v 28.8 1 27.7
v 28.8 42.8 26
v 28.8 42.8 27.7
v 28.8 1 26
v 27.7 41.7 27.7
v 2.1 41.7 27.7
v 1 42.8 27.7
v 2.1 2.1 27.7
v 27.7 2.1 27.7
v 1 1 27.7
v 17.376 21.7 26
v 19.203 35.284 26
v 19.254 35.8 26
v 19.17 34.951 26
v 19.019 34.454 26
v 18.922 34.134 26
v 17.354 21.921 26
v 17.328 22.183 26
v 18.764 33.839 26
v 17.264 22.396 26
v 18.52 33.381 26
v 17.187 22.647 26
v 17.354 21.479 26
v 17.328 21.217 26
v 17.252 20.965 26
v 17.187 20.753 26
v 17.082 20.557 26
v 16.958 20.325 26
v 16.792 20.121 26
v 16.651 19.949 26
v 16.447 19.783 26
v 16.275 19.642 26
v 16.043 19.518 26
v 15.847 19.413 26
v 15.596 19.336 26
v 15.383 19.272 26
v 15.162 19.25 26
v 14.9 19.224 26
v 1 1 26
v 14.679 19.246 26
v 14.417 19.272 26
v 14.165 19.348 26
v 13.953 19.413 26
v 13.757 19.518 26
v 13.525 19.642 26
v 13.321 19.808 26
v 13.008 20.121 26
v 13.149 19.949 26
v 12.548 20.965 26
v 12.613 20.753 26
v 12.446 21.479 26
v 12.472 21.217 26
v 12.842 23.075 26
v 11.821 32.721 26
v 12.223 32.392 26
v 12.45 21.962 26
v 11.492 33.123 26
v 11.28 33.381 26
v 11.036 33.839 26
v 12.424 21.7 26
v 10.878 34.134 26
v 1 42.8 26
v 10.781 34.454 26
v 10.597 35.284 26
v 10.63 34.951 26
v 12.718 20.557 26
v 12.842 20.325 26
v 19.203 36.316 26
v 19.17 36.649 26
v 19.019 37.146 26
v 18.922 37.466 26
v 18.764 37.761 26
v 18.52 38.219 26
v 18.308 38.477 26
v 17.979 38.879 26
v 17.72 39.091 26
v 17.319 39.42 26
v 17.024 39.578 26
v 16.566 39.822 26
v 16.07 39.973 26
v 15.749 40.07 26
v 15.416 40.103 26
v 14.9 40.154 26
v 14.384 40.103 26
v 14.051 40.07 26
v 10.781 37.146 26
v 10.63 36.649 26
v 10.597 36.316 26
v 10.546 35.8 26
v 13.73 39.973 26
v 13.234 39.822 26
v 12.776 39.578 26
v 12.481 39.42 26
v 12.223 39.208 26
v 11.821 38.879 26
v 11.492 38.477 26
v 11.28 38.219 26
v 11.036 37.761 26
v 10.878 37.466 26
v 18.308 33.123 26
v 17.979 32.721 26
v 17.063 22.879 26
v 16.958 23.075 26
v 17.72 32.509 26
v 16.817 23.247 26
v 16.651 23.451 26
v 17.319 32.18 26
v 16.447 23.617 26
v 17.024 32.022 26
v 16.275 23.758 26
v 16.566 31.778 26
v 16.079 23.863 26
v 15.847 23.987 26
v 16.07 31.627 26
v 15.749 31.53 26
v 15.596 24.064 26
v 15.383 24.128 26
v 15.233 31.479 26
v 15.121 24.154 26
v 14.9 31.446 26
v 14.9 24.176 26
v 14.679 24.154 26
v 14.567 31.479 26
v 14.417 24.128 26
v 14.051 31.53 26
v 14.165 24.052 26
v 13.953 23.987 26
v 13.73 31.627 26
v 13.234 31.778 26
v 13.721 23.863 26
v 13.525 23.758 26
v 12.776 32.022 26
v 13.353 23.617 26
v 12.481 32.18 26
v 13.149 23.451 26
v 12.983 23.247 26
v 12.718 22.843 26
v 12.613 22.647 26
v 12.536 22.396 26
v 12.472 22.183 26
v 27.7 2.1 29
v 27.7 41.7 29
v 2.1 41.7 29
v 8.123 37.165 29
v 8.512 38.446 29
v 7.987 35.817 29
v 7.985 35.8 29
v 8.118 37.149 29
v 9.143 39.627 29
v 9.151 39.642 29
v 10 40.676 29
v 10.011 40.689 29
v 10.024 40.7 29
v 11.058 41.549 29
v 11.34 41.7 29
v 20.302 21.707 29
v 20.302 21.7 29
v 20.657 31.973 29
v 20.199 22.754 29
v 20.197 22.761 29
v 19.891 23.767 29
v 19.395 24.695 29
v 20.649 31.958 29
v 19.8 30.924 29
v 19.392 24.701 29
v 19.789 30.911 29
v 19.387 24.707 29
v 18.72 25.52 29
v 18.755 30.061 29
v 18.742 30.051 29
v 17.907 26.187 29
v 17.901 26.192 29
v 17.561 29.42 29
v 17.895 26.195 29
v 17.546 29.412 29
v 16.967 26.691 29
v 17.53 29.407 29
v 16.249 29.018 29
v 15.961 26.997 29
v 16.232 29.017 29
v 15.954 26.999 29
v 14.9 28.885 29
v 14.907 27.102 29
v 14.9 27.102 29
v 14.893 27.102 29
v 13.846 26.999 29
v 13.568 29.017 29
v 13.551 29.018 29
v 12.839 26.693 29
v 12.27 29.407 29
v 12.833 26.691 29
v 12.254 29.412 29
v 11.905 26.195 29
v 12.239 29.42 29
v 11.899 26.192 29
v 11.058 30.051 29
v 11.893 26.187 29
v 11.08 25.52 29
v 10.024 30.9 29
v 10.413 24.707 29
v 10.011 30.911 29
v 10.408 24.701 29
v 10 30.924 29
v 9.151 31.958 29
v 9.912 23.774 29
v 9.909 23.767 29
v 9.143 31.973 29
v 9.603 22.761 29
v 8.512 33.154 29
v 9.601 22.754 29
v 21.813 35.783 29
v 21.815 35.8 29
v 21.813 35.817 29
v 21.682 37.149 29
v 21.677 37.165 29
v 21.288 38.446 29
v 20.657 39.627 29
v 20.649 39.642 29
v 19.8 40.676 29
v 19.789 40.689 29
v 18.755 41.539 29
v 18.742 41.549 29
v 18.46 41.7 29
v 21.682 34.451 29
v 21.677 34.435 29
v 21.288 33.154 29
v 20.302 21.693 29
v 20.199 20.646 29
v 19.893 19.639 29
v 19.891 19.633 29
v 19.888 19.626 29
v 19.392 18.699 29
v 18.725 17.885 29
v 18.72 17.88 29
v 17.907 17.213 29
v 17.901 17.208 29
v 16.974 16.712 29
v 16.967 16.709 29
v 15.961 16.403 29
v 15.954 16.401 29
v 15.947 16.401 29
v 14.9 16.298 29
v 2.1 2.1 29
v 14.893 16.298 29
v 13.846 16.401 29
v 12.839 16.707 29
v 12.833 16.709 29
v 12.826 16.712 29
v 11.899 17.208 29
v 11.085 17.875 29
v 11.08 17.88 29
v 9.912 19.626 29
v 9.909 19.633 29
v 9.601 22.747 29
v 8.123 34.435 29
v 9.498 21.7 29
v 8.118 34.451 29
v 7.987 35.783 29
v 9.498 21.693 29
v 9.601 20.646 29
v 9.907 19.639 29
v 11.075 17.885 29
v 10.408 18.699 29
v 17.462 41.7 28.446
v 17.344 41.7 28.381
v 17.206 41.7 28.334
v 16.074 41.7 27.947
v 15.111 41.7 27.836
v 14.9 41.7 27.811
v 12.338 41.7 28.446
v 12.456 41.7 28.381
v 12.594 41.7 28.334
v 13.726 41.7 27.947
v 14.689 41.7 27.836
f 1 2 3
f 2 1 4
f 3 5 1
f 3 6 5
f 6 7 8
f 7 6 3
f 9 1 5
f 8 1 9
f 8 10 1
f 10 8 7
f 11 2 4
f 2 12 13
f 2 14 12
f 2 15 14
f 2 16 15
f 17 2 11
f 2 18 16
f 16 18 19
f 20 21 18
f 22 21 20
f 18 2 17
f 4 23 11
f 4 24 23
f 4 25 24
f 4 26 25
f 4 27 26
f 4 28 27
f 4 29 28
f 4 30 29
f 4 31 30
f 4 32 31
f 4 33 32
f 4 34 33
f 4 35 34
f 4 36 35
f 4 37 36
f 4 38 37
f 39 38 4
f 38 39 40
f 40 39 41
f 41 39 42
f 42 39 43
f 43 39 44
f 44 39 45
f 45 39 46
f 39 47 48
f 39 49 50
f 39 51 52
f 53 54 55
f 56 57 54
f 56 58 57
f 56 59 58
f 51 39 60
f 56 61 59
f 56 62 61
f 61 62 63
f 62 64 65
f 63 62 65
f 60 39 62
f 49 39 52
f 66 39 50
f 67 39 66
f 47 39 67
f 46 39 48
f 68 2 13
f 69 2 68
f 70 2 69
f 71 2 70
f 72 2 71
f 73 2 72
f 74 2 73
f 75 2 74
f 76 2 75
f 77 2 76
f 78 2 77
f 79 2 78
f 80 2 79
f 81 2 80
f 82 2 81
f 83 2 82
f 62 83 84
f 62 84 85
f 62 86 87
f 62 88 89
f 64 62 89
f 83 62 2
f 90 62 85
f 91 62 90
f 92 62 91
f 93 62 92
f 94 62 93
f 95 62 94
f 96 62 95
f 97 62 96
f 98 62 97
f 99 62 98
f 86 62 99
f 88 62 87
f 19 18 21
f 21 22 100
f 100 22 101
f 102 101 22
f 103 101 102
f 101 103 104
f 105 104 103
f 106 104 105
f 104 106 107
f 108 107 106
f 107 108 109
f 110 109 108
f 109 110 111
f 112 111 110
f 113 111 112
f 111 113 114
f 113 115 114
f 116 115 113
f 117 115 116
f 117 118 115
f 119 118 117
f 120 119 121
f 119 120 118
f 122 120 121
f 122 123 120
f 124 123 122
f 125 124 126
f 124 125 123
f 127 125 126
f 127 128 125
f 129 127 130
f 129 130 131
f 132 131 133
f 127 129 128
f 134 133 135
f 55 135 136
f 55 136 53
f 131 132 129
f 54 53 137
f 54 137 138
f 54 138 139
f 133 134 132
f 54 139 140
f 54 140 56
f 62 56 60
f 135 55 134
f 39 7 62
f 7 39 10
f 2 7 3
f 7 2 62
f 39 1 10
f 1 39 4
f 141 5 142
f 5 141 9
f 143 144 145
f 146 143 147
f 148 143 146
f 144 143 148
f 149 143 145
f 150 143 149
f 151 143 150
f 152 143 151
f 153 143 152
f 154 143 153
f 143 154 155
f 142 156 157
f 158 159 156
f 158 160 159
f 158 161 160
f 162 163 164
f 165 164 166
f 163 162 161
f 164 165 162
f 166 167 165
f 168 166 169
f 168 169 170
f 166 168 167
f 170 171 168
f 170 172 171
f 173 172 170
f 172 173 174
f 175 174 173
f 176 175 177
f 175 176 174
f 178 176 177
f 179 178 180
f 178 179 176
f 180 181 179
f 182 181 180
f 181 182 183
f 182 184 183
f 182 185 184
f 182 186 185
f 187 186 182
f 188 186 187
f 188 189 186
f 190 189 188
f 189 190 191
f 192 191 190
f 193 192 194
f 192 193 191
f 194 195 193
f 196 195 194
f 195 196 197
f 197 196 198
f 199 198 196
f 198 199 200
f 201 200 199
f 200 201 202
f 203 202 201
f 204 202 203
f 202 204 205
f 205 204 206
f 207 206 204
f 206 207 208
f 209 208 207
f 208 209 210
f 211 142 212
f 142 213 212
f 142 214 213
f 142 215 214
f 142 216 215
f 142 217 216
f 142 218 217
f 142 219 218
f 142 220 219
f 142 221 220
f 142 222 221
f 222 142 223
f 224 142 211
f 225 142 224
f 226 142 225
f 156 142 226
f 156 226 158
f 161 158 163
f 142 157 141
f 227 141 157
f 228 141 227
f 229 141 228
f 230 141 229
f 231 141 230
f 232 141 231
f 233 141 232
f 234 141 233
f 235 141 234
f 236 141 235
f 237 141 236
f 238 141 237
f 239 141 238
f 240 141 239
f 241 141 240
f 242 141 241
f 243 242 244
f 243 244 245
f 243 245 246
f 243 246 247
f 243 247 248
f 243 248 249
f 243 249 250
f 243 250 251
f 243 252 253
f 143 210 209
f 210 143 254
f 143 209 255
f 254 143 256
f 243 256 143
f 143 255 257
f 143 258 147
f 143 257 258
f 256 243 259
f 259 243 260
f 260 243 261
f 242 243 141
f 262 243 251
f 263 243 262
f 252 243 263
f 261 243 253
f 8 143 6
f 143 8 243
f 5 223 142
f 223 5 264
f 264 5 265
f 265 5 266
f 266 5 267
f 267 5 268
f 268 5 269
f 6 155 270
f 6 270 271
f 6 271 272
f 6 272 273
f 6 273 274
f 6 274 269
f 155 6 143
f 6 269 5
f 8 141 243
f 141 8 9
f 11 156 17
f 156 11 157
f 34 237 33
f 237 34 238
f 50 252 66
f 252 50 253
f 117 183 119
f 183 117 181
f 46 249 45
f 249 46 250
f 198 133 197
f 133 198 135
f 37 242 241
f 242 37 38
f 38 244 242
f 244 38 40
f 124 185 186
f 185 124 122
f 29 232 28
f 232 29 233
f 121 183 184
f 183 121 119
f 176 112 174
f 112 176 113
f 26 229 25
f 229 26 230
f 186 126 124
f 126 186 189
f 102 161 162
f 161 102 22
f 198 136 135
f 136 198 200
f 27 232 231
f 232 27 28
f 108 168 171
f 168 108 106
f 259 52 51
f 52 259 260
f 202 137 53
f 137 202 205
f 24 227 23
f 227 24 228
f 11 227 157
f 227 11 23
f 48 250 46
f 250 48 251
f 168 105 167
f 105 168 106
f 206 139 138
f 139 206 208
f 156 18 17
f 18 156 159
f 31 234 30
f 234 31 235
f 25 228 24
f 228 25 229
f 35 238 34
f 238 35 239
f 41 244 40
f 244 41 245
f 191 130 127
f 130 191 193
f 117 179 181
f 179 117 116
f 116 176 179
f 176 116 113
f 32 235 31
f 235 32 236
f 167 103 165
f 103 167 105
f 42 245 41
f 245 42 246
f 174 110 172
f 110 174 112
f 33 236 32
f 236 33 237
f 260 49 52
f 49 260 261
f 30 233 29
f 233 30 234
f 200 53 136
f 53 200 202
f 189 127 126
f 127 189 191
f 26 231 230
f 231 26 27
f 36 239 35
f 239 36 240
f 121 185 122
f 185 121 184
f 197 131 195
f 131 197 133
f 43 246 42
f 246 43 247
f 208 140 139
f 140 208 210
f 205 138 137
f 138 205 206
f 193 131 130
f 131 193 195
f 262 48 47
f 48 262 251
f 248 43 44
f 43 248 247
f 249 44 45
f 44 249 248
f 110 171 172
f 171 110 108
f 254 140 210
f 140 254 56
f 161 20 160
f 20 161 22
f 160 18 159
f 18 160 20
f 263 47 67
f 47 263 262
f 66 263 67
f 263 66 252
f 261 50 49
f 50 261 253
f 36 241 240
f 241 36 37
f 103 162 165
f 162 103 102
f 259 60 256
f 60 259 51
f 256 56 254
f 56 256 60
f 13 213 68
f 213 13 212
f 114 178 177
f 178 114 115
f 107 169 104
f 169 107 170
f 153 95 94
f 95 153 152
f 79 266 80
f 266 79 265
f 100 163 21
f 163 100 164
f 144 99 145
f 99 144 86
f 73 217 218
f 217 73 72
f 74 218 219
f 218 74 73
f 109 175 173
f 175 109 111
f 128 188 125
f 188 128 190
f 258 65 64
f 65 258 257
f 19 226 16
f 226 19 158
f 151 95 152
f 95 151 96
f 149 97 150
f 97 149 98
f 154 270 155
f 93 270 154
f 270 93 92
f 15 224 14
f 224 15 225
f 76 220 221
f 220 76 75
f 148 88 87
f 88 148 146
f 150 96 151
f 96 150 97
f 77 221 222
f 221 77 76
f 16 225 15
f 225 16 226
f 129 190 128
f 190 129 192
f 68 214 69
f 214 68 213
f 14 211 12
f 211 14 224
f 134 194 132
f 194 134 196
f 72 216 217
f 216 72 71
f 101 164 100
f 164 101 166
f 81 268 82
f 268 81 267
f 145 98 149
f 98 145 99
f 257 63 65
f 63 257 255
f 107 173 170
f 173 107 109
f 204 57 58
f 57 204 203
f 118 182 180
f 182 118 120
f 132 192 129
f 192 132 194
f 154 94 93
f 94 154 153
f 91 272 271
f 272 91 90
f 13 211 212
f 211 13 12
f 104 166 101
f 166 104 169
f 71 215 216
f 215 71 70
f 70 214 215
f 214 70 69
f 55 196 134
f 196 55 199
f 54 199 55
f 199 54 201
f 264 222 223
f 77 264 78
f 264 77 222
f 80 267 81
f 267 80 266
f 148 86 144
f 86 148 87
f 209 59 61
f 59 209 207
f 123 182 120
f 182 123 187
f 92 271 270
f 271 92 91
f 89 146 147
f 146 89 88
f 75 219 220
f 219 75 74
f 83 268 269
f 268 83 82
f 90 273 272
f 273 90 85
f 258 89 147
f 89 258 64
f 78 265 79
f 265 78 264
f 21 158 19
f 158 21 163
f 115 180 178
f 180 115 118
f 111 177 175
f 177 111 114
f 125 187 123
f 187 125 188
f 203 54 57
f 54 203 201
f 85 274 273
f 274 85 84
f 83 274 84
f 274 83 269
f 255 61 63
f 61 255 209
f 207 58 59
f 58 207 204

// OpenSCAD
use<threads.scad>
$fn= 16;

module main_box() {
    difference() {

        // case size
        cube([30,44,25]);

        // cut-outs
        translate([7,-1,2])cube([16,25,4]);
        translate([7,-2,4])cube([16,44,24]);
        translate([7,-2,4])cube([16,44,24]);
        translate([5.2,-2,4])cube([19.6,44,2]);
        translate([2.3,-2,16])cube([25.4,32.75,1.2]);
        translate([3.9,-2,17.2])cube([22.2,44,6]);
        translate([2,-2,19.2])cube([26,44,6]);

        translate([1,-1,22])cube([28,44,2]);

        //screw holes thermo
        translate([8.3,39.75,-1])cylinder(h=26, r=1.3);
        translate([8.3,39.75,5])cylinder(h=26, r=2.3);
        translate([8.3,39.75,-1])cylinder($fn=6, h=3.0, r=3);

        translate([21.7,39.75,-1])cylinder(h=26, r=1.3);
        translate([21.7,39.75,5])cylinder(h=26, r=2.3);
        translate([21.7,39.75,-1])cylinder($fn=6, h=3.0, r=3);

        //screw holes visible
        translate([4.4,28.75,-1])cylinder(h=26, r=1.3);
        translate([4.4,28.75,17])cylinder(h=26, r=2.3);
        translate([4.4,28.75,-1])cylinder($fn=6, h=3.0, r=3);

        translate([25.6,28.75,-1])cylinder(h=26, r=1.3);
        translate([25.6,28.75,17])cylinder(h=26, r=2.3);
        translate([25.6,28.75,-1])cylinder($fn=6, h=3.0, r=3);

        translate([4.4,15.15,-1])cylinder(h=26, r=1.3);
        translate([4.4,15.15,17])cylinder(h=26, r=2.3);
        translate([4.4,15.15,-1])cylinder($fn=6, h=3.0, r=3);

        translate([25.6,15.15,-1])cylinder(h=26, r=1.3);
        translate([25.6,15.15,17])cylinder(h=26, r=2.3);
        translate([25.6,15.15,-1])cylinder($fn=6, h=3.0, r=3);

        // bottom plate mount
        // cut-out
        translate([1,-1,1])cube([28,3,22]);

        // screw and nut holes
        translate([4,0,11.5])rotate([270,0,0])cylinder(12, 1.3, 1.3);
        translate([4,10,11.5])rotate([270,0,0])cylinder($fn=6, h=2.0, r=3);
        translate([-1,10,8.9])cube([5,2,5.2]);

        translate([26,0,11.5])rotate([270,0,0])cylinder(12, 1.3, 1.3);
        translate([26,10,11.5])rotate([270,0,0])cylinder($fn=6, h=2.0, r=3);
        translate([27,10,8.9])cube([5,2,5.2]);
    };
};

module bottom_plate(){

    difference(){
        union(){
            translate([1,-2,1])cube([28,4,21]);
            translate([0,-2,0])cube([30,2,25]);
            translate([15,-2,8])rotate([270,0,0])cylinder($fn=32, h=6, r1=6, r2=4);
            translate([2,0,20])cube([26,2,5]);
        };
        translate([0,1,22])cube([30,2,2]);

        // cable hole
        translate([10,-3,15.5])cube([10, 8, 4.4]);
        translate([6.8,-3,19.5])cube([16.4, 8,0.4]);

        // screw and nut holes
        translate([4,-3,11.5])rotate([270,0,0])cylinder(h=6, r=1.3);
        translate([4,-3,11.5])rotate([270,0,0])cylinder(h=3, r=2.3);

        translate([26,-3,11.5])rotate([270,0,0])cylinder(h=6, r=1.3);
        translate([26,-3,11.5])rotate([270,0,0])cylinder(h=3, r=2.3);
       
        // thread
        translate([15,-3,8])rotate([270,0,0])english_thread(diameter=1/4, threads_per_inch=20, length=5/16);

    };
};

module front_plate(){
    difference(){
        union(){
            cube([27.8,41.8,1.7]);
            translate([1.1,1.1,0])cube([25.6,39.6,3]);
        }
        translate([13.9,20.7,-1])cylinder($fn=32, h=4.1, r1=1.5, r2=5.5);
        translate([13.9,34.8,-1])cylinder($fn=32, h=4.1, r1=3.5, r2=7.0);
    };
};


//main_box();

//translate([0, -3, 0])bottom_plate();

translate([1, 1, 26])front_plate();
